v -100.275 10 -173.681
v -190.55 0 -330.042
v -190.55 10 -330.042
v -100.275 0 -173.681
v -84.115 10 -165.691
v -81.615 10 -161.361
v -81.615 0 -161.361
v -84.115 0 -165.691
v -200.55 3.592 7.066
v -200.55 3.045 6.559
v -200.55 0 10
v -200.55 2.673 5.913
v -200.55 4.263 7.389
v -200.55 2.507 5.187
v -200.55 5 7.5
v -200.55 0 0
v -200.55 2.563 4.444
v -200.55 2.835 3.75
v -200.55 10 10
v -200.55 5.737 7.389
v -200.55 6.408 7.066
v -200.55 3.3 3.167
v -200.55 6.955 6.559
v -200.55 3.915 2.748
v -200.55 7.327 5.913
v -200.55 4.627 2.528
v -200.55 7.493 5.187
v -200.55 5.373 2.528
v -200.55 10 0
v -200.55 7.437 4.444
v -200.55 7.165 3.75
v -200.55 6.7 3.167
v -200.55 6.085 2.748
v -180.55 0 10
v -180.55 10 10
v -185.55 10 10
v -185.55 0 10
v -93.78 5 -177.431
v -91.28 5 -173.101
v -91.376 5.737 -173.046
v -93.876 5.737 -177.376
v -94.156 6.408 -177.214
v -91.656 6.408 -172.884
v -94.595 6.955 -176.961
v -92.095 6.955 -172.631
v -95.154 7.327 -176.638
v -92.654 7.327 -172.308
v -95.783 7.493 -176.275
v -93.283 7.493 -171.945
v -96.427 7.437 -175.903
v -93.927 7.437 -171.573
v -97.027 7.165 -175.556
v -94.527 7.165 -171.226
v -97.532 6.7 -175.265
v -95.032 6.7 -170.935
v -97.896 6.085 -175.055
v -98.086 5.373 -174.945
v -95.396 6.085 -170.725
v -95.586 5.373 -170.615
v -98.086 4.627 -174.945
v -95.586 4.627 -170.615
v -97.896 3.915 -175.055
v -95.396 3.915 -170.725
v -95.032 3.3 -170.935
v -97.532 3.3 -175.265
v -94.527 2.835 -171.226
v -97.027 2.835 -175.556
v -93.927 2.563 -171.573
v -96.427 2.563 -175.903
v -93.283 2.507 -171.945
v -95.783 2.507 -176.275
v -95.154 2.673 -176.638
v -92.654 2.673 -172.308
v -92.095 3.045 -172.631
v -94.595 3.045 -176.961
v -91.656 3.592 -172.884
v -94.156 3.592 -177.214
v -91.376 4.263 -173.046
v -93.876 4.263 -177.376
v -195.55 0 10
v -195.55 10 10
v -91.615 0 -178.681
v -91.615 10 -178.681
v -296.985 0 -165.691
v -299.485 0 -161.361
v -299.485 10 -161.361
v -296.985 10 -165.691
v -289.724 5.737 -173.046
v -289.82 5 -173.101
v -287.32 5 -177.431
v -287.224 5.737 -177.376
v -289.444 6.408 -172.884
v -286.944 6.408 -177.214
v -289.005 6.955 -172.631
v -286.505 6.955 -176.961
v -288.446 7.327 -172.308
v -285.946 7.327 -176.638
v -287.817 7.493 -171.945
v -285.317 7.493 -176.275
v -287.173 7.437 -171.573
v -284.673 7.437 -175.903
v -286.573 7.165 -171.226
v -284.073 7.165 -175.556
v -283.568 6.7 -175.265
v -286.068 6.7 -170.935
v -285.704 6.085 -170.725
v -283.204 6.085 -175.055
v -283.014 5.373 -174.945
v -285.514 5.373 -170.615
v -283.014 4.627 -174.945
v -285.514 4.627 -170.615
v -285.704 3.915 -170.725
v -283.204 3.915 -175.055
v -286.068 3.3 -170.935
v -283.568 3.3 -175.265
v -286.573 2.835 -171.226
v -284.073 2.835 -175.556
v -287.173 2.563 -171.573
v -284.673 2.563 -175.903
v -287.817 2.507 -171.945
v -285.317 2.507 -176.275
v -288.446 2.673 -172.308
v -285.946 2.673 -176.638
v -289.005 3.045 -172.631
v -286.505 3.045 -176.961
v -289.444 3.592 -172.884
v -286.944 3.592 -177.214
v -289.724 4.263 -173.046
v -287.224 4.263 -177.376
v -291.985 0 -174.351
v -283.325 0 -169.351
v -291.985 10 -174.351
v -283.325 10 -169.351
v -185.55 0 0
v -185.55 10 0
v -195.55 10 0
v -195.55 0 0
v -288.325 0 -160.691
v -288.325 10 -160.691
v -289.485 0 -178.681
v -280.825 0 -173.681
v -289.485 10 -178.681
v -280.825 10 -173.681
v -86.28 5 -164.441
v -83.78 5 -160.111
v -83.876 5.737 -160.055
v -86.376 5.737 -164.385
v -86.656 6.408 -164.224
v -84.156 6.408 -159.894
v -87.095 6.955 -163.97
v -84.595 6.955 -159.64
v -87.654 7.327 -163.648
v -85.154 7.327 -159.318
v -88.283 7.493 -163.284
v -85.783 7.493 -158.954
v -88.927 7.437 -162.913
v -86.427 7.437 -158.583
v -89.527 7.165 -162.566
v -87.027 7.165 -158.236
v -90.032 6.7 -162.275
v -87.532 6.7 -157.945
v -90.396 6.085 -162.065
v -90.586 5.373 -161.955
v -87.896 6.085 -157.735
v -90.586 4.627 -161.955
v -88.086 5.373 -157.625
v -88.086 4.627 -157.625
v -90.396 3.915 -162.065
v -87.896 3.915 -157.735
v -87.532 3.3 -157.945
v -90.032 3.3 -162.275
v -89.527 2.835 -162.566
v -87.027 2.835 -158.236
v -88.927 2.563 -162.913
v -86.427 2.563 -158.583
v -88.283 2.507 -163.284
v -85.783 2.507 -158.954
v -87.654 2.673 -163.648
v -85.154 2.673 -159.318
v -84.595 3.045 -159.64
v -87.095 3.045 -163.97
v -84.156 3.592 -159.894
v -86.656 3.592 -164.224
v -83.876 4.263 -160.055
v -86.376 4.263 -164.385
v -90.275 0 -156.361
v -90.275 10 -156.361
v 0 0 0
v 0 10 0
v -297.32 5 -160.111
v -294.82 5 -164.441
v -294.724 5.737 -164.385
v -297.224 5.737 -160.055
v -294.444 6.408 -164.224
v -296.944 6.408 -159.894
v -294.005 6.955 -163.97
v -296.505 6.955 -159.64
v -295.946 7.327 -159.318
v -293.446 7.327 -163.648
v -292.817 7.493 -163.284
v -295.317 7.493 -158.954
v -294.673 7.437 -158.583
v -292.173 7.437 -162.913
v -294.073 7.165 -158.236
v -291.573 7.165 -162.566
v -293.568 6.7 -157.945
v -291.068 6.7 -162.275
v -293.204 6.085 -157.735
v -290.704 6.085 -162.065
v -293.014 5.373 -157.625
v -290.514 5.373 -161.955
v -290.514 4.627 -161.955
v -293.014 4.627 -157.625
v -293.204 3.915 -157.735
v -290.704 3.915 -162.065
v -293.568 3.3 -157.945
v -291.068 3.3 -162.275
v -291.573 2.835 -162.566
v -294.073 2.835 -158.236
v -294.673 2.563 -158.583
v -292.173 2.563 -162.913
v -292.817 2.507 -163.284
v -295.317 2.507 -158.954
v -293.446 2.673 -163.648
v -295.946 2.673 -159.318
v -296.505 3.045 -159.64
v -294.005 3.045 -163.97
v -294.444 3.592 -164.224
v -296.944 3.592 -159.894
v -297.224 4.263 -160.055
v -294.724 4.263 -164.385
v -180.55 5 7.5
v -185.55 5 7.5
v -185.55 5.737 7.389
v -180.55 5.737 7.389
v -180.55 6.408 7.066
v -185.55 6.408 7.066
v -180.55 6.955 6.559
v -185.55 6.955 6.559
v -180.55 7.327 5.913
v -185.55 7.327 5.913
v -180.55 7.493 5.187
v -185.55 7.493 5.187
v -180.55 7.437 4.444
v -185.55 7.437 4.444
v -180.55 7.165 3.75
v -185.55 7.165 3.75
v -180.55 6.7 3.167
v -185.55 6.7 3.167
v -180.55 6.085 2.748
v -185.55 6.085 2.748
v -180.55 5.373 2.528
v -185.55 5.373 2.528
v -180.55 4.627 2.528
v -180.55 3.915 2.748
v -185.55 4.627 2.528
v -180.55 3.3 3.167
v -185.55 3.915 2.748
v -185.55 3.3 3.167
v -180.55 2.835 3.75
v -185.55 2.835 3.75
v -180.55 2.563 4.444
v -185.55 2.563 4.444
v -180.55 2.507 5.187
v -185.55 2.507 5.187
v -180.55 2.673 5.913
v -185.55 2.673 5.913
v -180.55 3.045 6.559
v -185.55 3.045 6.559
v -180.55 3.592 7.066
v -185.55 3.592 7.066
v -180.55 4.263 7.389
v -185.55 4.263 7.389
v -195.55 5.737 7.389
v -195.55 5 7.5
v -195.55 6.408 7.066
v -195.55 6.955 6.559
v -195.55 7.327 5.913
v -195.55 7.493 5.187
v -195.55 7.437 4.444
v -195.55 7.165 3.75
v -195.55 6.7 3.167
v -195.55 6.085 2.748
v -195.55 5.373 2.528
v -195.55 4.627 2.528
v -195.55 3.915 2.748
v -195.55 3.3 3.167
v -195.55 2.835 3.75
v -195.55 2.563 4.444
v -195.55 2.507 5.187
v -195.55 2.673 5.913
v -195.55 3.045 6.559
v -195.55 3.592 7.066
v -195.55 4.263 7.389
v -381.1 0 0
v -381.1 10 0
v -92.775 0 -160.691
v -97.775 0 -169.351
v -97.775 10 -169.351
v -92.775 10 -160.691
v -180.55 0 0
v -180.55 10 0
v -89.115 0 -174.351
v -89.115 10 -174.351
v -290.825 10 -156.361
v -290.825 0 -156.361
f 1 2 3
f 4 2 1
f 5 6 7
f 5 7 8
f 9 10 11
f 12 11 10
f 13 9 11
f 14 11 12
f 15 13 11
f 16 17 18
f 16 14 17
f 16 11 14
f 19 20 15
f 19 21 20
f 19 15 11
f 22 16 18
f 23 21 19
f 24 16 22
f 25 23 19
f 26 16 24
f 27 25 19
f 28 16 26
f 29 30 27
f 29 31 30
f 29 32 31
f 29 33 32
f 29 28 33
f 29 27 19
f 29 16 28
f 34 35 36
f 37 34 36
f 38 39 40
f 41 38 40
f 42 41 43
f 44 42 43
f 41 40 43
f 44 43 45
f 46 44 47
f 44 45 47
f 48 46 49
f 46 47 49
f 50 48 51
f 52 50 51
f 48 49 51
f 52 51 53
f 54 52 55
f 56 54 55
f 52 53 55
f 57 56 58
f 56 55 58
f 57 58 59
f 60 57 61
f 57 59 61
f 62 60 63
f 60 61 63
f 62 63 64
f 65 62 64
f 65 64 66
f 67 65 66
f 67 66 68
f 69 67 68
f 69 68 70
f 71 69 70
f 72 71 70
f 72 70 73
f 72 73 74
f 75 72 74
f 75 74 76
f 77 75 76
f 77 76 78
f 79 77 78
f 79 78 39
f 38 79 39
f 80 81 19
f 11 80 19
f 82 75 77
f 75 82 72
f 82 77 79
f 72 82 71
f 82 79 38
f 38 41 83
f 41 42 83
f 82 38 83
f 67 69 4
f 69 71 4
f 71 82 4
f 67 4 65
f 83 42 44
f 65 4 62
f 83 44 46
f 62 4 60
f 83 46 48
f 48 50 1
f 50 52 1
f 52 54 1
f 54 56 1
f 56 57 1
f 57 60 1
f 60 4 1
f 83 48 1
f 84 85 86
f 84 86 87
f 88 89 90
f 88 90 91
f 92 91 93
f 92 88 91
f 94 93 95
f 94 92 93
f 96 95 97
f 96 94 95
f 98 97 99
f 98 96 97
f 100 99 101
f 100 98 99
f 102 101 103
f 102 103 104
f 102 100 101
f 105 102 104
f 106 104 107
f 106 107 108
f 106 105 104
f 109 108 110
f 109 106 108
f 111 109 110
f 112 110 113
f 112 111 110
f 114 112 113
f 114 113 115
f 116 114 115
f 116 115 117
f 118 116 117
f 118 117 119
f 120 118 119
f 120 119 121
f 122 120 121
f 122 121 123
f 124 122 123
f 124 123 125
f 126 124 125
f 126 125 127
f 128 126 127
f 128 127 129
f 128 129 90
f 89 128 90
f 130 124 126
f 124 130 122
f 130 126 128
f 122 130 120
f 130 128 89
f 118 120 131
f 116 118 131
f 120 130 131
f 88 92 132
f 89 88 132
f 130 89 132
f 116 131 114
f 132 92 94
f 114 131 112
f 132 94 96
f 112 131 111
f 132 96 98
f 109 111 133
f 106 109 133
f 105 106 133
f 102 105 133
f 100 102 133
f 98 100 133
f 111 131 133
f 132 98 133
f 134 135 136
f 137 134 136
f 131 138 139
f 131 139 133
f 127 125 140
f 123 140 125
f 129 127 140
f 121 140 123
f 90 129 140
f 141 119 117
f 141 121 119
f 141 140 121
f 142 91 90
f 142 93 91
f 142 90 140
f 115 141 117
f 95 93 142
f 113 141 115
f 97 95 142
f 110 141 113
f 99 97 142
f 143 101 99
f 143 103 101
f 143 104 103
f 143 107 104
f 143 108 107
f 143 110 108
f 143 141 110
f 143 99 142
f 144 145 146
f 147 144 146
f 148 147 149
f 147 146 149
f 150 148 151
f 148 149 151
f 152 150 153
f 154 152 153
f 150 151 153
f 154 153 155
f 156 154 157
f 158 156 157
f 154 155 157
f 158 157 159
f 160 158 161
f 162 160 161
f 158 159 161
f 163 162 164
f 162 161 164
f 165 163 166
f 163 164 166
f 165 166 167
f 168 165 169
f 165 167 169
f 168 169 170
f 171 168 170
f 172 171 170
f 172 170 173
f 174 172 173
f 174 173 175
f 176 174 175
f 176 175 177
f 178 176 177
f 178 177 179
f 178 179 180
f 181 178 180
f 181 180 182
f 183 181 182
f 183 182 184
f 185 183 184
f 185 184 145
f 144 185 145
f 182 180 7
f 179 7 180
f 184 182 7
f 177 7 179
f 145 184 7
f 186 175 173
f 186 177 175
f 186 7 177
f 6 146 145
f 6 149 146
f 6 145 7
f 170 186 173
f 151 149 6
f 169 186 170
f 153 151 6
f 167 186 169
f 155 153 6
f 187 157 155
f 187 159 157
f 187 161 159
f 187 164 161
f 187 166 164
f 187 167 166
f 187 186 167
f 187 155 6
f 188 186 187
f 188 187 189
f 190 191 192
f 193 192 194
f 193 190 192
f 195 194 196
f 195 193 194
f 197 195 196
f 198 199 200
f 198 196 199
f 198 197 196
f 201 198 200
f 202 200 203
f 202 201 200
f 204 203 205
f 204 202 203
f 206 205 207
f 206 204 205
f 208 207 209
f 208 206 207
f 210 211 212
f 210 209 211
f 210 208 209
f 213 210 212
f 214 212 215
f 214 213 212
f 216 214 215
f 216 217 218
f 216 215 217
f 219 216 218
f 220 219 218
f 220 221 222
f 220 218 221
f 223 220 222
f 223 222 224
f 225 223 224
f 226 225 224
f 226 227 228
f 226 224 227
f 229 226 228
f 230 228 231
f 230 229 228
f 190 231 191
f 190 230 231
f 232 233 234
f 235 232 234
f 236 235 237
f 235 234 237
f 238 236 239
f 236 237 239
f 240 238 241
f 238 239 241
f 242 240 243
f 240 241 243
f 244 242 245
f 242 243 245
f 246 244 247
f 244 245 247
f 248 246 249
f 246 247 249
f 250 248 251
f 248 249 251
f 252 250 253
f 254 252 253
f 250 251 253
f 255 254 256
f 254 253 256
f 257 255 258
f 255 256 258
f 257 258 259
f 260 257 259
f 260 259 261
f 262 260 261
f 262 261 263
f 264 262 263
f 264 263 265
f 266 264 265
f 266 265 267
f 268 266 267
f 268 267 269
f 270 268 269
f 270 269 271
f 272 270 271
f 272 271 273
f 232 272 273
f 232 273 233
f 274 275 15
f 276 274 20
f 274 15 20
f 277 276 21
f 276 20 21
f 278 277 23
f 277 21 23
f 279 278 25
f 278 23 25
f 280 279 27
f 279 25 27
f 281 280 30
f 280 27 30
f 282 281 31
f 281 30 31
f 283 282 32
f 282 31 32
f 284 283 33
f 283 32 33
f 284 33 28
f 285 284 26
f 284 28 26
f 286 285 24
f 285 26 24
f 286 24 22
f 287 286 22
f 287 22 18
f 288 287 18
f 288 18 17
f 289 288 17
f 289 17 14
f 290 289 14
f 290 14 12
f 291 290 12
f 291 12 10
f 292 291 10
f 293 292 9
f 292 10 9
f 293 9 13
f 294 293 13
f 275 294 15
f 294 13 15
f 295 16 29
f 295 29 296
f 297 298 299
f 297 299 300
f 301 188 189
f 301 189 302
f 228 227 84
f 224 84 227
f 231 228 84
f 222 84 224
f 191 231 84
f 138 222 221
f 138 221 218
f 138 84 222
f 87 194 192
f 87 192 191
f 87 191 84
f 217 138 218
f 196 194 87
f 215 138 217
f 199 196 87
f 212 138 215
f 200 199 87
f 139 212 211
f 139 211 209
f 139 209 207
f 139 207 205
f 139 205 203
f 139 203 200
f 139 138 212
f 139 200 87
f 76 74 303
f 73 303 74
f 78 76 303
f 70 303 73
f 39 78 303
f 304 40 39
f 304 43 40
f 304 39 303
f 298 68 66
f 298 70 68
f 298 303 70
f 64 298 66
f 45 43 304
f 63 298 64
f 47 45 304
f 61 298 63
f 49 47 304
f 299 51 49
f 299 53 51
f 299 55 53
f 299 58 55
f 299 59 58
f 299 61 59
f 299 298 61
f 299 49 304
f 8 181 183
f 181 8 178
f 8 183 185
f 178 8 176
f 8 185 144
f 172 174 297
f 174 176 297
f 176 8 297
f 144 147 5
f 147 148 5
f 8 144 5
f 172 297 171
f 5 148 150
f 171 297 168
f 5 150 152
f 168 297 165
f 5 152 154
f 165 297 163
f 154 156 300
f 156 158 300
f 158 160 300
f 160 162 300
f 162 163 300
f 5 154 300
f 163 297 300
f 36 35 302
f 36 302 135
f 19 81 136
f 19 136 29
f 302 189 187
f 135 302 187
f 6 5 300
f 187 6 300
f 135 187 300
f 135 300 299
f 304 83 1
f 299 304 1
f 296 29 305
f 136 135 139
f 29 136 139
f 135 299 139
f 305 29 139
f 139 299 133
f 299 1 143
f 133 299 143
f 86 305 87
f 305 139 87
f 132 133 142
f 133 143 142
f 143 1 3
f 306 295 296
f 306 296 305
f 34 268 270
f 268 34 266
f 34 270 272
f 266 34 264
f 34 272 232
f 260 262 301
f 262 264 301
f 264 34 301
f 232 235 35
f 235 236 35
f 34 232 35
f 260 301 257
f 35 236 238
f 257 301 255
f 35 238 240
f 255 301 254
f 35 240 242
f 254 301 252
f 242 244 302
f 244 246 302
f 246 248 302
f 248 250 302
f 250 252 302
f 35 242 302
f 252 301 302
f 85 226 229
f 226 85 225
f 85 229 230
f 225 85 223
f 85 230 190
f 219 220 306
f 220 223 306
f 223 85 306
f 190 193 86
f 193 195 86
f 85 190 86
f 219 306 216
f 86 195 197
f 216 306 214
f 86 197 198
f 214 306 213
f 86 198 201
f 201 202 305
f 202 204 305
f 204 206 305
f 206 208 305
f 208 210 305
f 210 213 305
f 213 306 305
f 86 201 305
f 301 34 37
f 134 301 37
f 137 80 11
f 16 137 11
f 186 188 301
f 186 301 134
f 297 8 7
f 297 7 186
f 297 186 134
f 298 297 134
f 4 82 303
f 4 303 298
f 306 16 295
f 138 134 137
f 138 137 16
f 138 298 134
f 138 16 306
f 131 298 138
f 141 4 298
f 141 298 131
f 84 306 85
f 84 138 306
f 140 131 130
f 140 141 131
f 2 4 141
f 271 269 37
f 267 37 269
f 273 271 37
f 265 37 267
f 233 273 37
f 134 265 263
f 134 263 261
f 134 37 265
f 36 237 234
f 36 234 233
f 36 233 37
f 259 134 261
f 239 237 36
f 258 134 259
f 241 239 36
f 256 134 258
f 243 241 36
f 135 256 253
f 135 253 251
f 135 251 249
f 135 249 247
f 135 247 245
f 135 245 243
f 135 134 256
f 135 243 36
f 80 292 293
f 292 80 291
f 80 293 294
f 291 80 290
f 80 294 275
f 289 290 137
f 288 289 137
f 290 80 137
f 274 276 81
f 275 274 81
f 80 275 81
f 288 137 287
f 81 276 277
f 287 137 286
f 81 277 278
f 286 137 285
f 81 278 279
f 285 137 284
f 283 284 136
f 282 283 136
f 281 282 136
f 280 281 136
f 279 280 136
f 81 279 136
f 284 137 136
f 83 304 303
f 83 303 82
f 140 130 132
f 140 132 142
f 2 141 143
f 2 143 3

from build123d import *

# Parameters (mm, degrees)
BOSS_EXTRUDE1_DEPTH     = 10
SKETCH3_W               = 5
SKETCH3_H               = 10
BOSS_EXTRUDE2_DEPTH     = 10
SKETCH5_R               = 2.5
CUT_EXTRUDE1_DEPTH      = 20
MIRROR2_COPY_1_SKETCH_W = 5
MIRROR2_COPY_1_SKETCH_H = 10
MIRROR2_COPY_1_DEPTH    = 10
MIRROR2_COPY_2_SKETCH_R = 2.5
MIRROR2_COPY_2_DEPTH    = 20


with BuildPart() as part:
    # Sketch1 → Boss-Extrude1 (new body)
    with BuildSketch(Plane(origin=(0, 0, 0), x_dir=(1, 0, 0), z_dir=(0, 1, 0))):
        Polygon((-381.1, 0), (-190.55, 330.042281382), (0, 0), align=None)
    extrude(amount=BOSS_EXTRUDE1_DEPTH)

    # Sketch3 → Boss-Extrude2 (add)
    with BuildSketch(Plane(origin=(0, 0, 0), x_dir=(-0.5, 0, -0.866025404), z_dir=(0.866025404, 0, -0.5))):
        with Locations((198.05, 5)):
            Rectangle(SKETCH3_W, SKETCH3_H)
        with Locations((183.05, 5)):
            Rectangle(SKETCH3_W, SKETCH3_H)
    boss_extrude2 = extrude(amount=BOSS_EXTRUDE2_DEPTH)

    # Sketch5 → Cut-Extrude1 (cut)
    with BuildSketch(Plane(origin=(-90.275, 0, -156.360886653), x_dir=(0.866025404, 0, -0.5), z_dir=(0.5, 0, 0.866025404))):
        with Locations((5, 5)):
            Circle(SKETCH5_R)
    cut_extrude1 = extrude(amount=-CUT_EXTRUDE1_DEPTH, mode=Mode.SUBTRACT)

    # Mirror1: Boss-Extrude2, Cut-Extrude1 across plane
    add(boss_extrude2.mirror(Plane(origin=(0, 0, 0), x_dir=(0.866025404, 0, 0.5), z_dir=(-0.5, 0, 0.866025404))))
    add(cut_extrude1.mirror(Plane(origin=(0, 0, 0), x_dir=(0.866025404, 0, 0.5), z_dir=(-0.5, 0, 0.866025404))), mode=Mode.SUBTRACT)

    # Mirror2: Boss-Extrude2, Cut-Extrude1 across plane
    add(boss_extrude2.mirror(Plane(origin=(-190.55, 0, 0), x_dir=(0, 0, 1), z_dir=(1, 0, 0))))
    add(cut_extrude1.mirror(Plane(origin=(-190.55, 0, 0), x_dir=(0, 0, 1), z_dir=(1, 0, 0))), mode=Mode.SUBTRACT)

    # Mirror2 copy 1 sketch → Mirror2 copy 1 (add)
    with BuildSketch(Plane(origin=(-381.1, 0, 0), x_dir=(1, 0, 0), z_dir=(0, 0, 1))):
        with Locations((198.05, 5)):
            Rectangle(MIRROR2_COPY_1_SKETCH_W, MIRROR2_COPY_1_SKETCH_H)
        with Locations((183.05, 5)):
            Rectangle(MIRROR2_COPY_1_SKETCH_W, MIRROR2_COPY_1_SKETCH_H)
    extrude(amount=MIRROR2_COPY_1_DEPTH)

    # Mirror2 copy 2 sketch → Mirror2 copy 2 (cut)
    with BuildSketch(Plane.ZY.offset(200.55)):
        with Locations((5, 5)):
            Circle(MIRROR2_COPY_2_SKETCH_R)
    extrude(amount=-MIRROR2_COPY_2_DEPTH, mode=Mode.SUBTRACT)


solid = part.part
